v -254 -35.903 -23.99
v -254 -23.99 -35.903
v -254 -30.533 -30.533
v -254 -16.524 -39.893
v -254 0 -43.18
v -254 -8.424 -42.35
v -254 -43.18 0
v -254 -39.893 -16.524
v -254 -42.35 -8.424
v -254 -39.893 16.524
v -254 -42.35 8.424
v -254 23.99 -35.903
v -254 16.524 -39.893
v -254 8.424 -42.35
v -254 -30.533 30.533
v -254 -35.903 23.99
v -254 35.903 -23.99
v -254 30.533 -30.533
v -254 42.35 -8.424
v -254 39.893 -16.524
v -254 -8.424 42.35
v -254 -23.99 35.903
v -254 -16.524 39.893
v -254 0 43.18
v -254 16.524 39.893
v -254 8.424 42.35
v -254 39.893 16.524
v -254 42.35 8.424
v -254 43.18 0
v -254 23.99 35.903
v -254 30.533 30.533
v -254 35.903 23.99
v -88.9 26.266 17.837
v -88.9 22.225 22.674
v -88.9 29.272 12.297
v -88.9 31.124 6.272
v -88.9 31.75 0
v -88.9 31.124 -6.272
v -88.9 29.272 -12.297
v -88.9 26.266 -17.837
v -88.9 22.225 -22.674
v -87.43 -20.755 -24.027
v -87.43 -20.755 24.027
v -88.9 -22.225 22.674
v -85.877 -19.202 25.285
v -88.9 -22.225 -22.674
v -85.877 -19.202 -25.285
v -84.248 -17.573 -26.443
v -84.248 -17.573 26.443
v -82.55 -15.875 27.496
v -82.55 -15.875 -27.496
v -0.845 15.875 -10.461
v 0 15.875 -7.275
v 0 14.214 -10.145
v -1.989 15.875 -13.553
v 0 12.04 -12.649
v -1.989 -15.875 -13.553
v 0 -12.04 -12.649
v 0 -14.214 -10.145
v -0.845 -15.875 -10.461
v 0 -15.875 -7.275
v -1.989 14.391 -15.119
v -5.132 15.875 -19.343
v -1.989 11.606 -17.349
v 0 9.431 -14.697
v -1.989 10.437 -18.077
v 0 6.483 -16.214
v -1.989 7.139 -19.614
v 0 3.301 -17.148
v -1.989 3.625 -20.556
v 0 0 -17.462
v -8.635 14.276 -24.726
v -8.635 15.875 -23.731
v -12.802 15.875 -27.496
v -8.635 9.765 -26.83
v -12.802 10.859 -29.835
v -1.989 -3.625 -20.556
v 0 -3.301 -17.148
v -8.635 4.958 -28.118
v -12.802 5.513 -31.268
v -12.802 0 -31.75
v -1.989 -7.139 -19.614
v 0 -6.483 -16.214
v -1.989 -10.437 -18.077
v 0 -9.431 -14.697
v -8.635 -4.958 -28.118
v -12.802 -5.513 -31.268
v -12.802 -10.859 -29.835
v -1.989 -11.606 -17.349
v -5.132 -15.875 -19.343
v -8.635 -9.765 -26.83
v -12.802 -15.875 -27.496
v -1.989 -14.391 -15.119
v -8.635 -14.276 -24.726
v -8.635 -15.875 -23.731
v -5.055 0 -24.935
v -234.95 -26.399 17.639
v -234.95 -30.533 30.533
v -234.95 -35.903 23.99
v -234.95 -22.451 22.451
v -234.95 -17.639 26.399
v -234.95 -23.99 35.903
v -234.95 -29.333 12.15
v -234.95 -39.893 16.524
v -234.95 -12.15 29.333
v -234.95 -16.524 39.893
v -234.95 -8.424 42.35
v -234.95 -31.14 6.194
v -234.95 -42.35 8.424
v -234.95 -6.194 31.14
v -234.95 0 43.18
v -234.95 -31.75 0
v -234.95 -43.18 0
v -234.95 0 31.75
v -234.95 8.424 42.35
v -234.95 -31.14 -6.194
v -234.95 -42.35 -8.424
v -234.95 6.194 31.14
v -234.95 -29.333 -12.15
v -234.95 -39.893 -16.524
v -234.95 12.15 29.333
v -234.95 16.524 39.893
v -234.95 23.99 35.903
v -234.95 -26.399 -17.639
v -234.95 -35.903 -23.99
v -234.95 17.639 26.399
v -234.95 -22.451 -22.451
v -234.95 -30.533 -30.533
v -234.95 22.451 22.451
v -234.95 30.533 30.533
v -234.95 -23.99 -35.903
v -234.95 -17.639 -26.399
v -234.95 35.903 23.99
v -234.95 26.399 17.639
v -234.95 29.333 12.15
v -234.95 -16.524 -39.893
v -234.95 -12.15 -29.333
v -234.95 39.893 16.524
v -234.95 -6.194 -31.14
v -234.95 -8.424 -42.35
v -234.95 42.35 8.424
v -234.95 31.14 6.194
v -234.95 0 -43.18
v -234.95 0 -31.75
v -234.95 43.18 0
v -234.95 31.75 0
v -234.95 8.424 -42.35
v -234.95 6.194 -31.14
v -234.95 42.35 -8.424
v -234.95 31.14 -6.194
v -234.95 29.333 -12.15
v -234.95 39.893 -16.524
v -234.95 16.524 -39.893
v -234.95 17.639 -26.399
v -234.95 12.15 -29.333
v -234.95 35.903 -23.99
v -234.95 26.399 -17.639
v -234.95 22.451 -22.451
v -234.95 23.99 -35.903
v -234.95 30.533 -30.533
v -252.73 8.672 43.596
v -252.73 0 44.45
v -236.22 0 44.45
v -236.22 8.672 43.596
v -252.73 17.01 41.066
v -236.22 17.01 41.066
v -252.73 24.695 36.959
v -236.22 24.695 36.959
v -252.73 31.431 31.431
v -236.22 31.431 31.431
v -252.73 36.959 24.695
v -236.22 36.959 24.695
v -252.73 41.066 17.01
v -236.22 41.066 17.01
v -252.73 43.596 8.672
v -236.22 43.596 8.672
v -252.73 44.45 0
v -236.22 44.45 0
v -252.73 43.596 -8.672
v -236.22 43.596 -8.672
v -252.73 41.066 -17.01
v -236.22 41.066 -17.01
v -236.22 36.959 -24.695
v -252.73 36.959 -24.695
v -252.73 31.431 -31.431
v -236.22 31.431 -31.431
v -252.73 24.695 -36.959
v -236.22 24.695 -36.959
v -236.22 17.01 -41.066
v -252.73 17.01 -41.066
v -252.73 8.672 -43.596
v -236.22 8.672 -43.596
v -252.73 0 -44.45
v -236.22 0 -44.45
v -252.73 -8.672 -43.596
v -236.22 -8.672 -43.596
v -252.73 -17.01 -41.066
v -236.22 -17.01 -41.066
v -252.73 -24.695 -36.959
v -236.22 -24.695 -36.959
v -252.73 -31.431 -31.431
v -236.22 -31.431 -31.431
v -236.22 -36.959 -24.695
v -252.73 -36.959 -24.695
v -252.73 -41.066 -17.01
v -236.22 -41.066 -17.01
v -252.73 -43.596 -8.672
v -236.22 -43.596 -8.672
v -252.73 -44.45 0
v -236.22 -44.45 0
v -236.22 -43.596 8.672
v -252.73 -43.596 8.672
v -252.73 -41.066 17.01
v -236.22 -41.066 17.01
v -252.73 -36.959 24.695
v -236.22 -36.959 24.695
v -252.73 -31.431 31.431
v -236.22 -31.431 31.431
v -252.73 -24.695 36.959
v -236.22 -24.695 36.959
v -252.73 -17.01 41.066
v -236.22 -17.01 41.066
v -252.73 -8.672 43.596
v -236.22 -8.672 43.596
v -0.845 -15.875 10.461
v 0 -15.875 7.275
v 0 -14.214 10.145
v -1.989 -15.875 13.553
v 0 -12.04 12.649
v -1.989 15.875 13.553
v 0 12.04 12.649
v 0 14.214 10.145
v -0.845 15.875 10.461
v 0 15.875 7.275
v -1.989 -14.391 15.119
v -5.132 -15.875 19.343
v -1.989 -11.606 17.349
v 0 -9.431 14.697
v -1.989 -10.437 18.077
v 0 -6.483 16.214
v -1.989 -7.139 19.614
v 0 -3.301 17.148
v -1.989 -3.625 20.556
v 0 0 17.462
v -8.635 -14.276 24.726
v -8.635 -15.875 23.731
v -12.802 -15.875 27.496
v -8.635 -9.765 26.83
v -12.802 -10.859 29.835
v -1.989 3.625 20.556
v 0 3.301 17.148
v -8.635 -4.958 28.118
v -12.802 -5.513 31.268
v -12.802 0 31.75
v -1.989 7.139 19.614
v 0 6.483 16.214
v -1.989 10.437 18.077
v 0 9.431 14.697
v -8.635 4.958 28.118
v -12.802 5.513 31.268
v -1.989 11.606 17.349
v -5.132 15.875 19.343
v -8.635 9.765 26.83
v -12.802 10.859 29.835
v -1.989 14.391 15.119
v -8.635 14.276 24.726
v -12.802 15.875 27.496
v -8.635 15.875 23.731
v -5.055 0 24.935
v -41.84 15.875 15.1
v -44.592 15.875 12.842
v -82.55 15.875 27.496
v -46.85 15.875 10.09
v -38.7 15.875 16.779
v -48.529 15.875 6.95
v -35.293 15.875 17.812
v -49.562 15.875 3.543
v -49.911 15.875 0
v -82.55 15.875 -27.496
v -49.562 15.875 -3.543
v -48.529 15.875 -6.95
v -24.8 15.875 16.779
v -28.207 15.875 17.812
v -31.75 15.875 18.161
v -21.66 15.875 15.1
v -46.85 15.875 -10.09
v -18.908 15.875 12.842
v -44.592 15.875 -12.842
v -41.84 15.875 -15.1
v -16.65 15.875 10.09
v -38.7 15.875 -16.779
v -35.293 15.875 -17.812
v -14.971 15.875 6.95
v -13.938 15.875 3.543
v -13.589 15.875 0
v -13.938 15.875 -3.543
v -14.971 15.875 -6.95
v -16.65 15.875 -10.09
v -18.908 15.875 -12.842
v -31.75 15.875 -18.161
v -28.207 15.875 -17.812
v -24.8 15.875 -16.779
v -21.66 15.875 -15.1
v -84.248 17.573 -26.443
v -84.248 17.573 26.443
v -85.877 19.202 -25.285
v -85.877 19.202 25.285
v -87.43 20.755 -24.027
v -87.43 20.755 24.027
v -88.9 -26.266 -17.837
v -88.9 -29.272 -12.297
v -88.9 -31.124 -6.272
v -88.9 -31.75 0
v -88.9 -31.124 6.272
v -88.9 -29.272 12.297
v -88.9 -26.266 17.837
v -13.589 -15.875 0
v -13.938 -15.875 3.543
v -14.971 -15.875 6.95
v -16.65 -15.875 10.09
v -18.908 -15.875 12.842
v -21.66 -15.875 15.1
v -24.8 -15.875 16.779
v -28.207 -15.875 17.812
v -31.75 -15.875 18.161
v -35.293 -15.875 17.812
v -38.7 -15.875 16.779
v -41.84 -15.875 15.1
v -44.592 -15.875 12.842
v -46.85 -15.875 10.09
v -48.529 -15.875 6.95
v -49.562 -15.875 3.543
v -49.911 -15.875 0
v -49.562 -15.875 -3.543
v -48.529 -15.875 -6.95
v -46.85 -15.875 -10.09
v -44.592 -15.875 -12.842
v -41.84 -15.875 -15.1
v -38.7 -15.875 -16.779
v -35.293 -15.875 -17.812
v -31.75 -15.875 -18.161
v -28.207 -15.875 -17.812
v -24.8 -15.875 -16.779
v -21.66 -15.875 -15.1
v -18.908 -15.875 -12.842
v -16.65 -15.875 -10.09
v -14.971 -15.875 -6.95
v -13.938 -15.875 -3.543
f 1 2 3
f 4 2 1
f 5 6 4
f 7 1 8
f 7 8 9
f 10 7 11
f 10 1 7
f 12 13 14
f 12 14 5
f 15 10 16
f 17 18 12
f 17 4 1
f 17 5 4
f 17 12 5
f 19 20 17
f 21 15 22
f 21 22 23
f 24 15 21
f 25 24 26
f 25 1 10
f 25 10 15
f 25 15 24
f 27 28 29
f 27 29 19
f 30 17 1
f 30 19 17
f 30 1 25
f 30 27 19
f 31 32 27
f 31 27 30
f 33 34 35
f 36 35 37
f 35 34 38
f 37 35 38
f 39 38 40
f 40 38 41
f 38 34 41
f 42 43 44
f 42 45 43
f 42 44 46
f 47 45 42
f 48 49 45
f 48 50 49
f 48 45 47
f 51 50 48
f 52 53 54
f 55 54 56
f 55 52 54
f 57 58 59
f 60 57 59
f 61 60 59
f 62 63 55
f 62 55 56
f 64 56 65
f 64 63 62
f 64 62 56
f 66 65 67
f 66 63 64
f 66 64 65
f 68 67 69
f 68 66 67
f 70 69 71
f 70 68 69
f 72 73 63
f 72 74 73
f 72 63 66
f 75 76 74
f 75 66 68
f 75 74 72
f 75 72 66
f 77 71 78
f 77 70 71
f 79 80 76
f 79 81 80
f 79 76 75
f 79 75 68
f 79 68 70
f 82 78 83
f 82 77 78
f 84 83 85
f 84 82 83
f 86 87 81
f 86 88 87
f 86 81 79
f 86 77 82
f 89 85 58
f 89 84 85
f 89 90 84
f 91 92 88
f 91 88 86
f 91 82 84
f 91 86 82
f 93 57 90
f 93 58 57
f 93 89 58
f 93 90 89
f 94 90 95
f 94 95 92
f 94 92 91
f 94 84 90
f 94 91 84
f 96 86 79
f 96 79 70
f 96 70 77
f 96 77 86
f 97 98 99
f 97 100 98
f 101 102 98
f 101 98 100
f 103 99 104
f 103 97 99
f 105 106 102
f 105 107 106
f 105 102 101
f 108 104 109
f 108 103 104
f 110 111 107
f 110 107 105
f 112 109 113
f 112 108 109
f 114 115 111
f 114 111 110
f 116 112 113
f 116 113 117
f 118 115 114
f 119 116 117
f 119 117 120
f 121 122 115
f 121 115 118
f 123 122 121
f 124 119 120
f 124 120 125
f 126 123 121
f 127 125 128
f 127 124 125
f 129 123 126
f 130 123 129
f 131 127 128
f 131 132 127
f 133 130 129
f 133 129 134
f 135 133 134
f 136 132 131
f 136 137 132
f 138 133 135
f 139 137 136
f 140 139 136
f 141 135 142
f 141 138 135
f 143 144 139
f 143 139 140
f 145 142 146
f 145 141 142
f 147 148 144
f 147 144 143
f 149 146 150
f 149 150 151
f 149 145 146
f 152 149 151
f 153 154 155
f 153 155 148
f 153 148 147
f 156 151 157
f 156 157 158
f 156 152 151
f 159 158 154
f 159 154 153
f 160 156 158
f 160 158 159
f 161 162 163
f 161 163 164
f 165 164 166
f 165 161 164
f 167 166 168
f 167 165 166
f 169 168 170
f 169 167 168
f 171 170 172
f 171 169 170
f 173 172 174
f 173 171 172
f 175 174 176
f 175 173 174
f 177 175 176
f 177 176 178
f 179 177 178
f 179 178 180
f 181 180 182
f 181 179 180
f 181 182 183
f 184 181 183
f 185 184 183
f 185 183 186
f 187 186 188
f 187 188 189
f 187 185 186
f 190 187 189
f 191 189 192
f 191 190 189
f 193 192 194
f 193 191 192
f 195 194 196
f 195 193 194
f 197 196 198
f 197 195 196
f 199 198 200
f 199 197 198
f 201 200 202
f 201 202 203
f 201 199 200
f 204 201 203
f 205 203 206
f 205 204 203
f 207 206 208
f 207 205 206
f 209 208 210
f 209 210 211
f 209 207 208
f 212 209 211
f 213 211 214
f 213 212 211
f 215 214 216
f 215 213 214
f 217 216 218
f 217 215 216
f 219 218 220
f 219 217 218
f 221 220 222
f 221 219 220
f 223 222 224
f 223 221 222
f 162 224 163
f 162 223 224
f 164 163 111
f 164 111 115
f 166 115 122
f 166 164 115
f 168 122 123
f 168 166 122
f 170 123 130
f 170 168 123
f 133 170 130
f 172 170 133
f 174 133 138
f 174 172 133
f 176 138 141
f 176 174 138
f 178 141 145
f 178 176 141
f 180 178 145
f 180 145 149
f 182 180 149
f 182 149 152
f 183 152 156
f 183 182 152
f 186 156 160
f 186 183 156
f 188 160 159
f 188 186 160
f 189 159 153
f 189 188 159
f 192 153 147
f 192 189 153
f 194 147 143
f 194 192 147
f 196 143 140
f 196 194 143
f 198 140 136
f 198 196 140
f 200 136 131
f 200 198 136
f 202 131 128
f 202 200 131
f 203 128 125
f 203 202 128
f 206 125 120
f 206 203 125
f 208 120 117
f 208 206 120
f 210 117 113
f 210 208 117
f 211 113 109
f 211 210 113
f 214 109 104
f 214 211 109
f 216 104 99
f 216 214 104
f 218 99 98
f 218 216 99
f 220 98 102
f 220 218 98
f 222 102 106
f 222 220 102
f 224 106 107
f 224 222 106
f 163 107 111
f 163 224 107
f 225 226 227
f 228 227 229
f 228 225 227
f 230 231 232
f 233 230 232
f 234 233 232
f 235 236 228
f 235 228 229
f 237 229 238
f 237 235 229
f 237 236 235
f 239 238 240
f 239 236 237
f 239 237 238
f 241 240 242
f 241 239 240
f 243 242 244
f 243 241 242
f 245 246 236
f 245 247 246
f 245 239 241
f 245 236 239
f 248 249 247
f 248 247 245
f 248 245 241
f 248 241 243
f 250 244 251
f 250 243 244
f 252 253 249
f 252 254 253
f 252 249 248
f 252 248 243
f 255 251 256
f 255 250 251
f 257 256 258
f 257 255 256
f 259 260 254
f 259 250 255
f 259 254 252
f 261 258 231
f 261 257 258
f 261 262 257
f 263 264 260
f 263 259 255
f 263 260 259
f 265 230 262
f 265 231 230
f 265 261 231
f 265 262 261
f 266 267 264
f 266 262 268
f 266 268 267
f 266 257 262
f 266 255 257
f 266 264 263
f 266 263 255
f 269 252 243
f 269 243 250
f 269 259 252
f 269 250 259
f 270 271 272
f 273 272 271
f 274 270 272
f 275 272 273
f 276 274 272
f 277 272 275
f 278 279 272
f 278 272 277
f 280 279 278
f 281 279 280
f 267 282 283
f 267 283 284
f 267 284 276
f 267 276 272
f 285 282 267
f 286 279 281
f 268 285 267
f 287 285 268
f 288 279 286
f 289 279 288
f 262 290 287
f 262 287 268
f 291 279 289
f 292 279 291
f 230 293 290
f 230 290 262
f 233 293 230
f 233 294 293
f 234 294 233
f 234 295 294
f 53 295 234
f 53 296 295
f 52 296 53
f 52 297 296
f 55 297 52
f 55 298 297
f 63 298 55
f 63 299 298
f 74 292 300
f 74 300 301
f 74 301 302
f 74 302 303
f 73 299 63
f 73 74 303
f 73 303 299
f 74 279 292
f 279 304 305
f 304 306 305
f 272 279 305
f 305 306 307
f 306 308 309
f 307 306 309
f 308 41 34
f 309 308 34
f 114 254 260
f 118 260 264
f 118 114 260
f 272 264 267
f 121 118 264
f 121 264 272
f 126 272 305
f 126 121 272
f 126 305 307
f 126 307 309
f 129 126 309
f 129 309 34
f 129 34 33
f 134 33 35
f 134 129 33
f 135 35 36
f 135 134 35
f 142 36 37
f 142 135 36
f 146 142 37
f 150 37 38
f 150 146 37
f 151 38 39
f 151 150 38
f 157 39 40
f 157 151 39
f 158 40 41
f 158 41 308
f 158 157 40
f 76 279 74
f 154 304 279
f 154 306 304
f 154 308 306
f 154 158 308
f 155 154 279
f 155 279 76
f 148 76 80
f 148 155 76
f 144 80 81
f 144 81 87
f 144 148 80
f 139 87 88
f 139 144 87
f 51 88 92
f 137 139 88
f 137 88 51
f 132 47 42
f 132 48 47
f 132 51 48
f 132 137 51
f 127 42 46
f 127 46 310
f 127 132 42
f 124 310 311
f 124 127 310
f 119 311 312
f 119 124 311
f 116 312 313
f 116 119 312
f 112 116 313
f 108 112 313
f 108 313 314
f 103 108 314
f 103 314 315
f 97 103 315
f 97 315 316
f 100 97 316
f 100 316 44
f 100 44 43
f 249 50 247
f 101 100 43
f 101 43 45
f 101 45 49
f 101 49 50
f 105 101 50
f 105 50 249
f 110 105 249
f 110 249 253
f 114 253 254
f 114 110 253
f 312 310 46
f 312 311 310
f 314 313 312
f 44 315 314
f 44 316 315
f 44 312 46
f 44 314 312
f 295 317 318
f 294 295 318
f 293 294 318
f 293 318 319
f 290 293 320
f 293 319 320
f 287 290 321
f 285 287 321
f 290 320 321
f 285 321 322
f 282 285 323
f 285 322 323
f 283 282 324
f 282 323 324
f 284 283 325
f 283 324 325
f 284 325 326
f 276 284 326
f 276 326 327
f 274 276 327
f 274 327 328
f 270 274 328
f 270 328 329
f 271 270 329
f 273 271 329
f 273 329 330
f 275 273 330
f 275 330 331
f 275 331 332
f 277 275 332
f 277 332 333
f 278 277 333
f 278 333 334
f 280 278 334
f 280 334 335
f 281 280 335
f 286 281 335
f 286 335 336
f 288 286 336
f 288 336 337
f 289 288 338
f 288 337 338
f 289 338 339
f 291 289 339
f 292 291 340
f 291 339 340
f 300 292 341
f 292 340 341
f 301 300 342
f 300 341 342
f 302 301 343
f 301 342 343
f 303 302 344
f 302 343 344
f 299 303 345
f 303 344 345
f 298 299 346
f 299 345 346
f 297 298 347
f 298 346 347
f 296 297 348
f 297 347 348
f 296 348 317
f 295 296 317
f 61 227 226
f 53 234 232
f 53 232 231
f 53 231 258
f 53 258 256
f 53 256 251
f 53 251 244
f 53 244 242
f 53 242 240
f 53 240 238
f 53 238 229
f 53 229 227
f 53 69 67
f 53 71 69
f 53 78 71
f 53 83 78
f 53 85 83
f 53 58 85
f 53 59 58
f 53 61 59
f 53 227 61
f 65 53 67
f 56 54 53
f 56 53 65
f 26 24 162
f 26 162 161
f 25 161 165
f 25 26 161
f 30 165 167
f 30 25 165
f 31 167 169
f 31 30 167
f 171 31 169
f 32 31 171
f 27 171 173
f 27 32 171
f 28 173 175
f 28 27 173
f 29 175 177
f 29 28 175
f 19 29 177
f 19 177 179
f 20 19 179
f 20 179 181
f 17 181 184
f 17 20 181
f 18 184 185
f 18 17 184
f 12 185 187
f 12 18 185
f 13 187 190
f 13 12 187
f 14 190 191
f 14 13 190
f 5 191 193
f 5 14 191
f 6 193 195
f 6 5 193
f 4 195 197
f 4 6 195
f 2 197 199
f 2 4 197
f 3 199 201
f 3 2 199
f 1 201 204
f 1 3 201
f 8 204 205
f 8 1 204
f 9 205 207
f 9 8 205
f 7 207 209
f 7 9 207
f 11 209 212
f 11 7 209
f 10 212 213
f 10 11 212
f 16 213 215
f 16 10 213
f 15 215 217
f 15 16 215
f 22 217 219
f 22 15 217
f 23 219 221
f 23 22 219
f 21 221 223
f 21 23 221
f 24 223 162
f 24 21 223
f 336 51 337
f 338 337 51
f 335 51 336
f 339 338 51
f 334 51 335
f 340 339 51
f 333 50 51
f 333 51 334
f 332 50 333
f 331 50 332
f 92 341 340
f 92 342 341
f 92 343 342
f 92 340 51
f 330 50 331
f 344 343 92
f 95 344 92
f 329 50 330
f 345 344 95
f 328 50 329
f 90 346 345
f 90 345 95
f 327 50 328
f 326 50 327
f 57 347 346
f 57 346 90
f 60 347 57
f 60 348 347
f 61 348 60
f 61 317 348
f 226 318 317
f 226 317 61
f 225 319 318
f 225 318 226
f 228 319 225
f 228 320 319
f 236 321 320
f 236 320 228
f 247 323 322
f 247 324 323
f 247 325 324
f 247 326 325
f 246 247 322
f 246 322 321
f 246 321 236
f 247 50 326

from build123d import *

# Parameters (mm, degrees)
F2_W     = 88.9
F2_H     = 15.875
F3_DEPTH = 31.75
F4_SIZE  = 6.35
F5_R     = 18.161
F6_DEPTH = 60.326
F7_SIZE  = 1.27


with BuildPart() as f1:
    # F0 (on Front) → F1 (revolve)
    with BuildSketch(Plane.XZ):
        with BuildLine():
            Line((-254, 0), (0, 0))
            Line((0, 0), (0, 17.4625))
            ThreePointArc((0, 17.4625), (-5.487017, 25.425187), (-12.801965, 31.75))
            Line((-12.801965, 31.75), (-234.95, 31.75))
            Line((-234.95, 31.75), (-234.95, 44.45))
            Line((-234.95, 44.45), (-254, 44.45))
            Line((-254, 44.45), (-254, 0))
        make_face()
    revolve(axis=Axis((-125.804233, 0, 0), (-1, 0, 0)))

    # F2 (on Top) → F3 (cut, symmetric)
    with BuildSketch(Plane.XY):
        with Locations((-44.45, 23.8125)):
            Rectangle(F2_W, F2_H)
        with Locations((-44.45, -23.8125)):
            Rectangle(F2_W, F2_H)
    extrude(amount=F3_DEPTH, both=True, mode=Mode.SUBTRACT)

    # F4
    f4_edges = [f1.edges().sort_by_distance(p)[0] for p in [
        (-88.9, -15.875, 0),
        (-88.9, 15.875, 0),
    ]]
    chamfer(f4_edges, length=F4_SIZE)

    # F5 (on face) → F6 (cut, through all)
    with BuildSketch(Plane.XZ.offset(15.875)):
        with Locations((-31.75, 0)):
            Circle(F5_R)
    extrude(amount=-F6_DEPTH, mode=Mode.SUBTRACT)

    # F7
    f7_edges = [f1.edges().sort_by_distance(p)[0] for p in [
        (-234.95, 0, -44.45),
        (-254, 0, -44.45),
    ]]
    chamfer(f7_edges, length=F7_SIZE)


solid = f1.part
